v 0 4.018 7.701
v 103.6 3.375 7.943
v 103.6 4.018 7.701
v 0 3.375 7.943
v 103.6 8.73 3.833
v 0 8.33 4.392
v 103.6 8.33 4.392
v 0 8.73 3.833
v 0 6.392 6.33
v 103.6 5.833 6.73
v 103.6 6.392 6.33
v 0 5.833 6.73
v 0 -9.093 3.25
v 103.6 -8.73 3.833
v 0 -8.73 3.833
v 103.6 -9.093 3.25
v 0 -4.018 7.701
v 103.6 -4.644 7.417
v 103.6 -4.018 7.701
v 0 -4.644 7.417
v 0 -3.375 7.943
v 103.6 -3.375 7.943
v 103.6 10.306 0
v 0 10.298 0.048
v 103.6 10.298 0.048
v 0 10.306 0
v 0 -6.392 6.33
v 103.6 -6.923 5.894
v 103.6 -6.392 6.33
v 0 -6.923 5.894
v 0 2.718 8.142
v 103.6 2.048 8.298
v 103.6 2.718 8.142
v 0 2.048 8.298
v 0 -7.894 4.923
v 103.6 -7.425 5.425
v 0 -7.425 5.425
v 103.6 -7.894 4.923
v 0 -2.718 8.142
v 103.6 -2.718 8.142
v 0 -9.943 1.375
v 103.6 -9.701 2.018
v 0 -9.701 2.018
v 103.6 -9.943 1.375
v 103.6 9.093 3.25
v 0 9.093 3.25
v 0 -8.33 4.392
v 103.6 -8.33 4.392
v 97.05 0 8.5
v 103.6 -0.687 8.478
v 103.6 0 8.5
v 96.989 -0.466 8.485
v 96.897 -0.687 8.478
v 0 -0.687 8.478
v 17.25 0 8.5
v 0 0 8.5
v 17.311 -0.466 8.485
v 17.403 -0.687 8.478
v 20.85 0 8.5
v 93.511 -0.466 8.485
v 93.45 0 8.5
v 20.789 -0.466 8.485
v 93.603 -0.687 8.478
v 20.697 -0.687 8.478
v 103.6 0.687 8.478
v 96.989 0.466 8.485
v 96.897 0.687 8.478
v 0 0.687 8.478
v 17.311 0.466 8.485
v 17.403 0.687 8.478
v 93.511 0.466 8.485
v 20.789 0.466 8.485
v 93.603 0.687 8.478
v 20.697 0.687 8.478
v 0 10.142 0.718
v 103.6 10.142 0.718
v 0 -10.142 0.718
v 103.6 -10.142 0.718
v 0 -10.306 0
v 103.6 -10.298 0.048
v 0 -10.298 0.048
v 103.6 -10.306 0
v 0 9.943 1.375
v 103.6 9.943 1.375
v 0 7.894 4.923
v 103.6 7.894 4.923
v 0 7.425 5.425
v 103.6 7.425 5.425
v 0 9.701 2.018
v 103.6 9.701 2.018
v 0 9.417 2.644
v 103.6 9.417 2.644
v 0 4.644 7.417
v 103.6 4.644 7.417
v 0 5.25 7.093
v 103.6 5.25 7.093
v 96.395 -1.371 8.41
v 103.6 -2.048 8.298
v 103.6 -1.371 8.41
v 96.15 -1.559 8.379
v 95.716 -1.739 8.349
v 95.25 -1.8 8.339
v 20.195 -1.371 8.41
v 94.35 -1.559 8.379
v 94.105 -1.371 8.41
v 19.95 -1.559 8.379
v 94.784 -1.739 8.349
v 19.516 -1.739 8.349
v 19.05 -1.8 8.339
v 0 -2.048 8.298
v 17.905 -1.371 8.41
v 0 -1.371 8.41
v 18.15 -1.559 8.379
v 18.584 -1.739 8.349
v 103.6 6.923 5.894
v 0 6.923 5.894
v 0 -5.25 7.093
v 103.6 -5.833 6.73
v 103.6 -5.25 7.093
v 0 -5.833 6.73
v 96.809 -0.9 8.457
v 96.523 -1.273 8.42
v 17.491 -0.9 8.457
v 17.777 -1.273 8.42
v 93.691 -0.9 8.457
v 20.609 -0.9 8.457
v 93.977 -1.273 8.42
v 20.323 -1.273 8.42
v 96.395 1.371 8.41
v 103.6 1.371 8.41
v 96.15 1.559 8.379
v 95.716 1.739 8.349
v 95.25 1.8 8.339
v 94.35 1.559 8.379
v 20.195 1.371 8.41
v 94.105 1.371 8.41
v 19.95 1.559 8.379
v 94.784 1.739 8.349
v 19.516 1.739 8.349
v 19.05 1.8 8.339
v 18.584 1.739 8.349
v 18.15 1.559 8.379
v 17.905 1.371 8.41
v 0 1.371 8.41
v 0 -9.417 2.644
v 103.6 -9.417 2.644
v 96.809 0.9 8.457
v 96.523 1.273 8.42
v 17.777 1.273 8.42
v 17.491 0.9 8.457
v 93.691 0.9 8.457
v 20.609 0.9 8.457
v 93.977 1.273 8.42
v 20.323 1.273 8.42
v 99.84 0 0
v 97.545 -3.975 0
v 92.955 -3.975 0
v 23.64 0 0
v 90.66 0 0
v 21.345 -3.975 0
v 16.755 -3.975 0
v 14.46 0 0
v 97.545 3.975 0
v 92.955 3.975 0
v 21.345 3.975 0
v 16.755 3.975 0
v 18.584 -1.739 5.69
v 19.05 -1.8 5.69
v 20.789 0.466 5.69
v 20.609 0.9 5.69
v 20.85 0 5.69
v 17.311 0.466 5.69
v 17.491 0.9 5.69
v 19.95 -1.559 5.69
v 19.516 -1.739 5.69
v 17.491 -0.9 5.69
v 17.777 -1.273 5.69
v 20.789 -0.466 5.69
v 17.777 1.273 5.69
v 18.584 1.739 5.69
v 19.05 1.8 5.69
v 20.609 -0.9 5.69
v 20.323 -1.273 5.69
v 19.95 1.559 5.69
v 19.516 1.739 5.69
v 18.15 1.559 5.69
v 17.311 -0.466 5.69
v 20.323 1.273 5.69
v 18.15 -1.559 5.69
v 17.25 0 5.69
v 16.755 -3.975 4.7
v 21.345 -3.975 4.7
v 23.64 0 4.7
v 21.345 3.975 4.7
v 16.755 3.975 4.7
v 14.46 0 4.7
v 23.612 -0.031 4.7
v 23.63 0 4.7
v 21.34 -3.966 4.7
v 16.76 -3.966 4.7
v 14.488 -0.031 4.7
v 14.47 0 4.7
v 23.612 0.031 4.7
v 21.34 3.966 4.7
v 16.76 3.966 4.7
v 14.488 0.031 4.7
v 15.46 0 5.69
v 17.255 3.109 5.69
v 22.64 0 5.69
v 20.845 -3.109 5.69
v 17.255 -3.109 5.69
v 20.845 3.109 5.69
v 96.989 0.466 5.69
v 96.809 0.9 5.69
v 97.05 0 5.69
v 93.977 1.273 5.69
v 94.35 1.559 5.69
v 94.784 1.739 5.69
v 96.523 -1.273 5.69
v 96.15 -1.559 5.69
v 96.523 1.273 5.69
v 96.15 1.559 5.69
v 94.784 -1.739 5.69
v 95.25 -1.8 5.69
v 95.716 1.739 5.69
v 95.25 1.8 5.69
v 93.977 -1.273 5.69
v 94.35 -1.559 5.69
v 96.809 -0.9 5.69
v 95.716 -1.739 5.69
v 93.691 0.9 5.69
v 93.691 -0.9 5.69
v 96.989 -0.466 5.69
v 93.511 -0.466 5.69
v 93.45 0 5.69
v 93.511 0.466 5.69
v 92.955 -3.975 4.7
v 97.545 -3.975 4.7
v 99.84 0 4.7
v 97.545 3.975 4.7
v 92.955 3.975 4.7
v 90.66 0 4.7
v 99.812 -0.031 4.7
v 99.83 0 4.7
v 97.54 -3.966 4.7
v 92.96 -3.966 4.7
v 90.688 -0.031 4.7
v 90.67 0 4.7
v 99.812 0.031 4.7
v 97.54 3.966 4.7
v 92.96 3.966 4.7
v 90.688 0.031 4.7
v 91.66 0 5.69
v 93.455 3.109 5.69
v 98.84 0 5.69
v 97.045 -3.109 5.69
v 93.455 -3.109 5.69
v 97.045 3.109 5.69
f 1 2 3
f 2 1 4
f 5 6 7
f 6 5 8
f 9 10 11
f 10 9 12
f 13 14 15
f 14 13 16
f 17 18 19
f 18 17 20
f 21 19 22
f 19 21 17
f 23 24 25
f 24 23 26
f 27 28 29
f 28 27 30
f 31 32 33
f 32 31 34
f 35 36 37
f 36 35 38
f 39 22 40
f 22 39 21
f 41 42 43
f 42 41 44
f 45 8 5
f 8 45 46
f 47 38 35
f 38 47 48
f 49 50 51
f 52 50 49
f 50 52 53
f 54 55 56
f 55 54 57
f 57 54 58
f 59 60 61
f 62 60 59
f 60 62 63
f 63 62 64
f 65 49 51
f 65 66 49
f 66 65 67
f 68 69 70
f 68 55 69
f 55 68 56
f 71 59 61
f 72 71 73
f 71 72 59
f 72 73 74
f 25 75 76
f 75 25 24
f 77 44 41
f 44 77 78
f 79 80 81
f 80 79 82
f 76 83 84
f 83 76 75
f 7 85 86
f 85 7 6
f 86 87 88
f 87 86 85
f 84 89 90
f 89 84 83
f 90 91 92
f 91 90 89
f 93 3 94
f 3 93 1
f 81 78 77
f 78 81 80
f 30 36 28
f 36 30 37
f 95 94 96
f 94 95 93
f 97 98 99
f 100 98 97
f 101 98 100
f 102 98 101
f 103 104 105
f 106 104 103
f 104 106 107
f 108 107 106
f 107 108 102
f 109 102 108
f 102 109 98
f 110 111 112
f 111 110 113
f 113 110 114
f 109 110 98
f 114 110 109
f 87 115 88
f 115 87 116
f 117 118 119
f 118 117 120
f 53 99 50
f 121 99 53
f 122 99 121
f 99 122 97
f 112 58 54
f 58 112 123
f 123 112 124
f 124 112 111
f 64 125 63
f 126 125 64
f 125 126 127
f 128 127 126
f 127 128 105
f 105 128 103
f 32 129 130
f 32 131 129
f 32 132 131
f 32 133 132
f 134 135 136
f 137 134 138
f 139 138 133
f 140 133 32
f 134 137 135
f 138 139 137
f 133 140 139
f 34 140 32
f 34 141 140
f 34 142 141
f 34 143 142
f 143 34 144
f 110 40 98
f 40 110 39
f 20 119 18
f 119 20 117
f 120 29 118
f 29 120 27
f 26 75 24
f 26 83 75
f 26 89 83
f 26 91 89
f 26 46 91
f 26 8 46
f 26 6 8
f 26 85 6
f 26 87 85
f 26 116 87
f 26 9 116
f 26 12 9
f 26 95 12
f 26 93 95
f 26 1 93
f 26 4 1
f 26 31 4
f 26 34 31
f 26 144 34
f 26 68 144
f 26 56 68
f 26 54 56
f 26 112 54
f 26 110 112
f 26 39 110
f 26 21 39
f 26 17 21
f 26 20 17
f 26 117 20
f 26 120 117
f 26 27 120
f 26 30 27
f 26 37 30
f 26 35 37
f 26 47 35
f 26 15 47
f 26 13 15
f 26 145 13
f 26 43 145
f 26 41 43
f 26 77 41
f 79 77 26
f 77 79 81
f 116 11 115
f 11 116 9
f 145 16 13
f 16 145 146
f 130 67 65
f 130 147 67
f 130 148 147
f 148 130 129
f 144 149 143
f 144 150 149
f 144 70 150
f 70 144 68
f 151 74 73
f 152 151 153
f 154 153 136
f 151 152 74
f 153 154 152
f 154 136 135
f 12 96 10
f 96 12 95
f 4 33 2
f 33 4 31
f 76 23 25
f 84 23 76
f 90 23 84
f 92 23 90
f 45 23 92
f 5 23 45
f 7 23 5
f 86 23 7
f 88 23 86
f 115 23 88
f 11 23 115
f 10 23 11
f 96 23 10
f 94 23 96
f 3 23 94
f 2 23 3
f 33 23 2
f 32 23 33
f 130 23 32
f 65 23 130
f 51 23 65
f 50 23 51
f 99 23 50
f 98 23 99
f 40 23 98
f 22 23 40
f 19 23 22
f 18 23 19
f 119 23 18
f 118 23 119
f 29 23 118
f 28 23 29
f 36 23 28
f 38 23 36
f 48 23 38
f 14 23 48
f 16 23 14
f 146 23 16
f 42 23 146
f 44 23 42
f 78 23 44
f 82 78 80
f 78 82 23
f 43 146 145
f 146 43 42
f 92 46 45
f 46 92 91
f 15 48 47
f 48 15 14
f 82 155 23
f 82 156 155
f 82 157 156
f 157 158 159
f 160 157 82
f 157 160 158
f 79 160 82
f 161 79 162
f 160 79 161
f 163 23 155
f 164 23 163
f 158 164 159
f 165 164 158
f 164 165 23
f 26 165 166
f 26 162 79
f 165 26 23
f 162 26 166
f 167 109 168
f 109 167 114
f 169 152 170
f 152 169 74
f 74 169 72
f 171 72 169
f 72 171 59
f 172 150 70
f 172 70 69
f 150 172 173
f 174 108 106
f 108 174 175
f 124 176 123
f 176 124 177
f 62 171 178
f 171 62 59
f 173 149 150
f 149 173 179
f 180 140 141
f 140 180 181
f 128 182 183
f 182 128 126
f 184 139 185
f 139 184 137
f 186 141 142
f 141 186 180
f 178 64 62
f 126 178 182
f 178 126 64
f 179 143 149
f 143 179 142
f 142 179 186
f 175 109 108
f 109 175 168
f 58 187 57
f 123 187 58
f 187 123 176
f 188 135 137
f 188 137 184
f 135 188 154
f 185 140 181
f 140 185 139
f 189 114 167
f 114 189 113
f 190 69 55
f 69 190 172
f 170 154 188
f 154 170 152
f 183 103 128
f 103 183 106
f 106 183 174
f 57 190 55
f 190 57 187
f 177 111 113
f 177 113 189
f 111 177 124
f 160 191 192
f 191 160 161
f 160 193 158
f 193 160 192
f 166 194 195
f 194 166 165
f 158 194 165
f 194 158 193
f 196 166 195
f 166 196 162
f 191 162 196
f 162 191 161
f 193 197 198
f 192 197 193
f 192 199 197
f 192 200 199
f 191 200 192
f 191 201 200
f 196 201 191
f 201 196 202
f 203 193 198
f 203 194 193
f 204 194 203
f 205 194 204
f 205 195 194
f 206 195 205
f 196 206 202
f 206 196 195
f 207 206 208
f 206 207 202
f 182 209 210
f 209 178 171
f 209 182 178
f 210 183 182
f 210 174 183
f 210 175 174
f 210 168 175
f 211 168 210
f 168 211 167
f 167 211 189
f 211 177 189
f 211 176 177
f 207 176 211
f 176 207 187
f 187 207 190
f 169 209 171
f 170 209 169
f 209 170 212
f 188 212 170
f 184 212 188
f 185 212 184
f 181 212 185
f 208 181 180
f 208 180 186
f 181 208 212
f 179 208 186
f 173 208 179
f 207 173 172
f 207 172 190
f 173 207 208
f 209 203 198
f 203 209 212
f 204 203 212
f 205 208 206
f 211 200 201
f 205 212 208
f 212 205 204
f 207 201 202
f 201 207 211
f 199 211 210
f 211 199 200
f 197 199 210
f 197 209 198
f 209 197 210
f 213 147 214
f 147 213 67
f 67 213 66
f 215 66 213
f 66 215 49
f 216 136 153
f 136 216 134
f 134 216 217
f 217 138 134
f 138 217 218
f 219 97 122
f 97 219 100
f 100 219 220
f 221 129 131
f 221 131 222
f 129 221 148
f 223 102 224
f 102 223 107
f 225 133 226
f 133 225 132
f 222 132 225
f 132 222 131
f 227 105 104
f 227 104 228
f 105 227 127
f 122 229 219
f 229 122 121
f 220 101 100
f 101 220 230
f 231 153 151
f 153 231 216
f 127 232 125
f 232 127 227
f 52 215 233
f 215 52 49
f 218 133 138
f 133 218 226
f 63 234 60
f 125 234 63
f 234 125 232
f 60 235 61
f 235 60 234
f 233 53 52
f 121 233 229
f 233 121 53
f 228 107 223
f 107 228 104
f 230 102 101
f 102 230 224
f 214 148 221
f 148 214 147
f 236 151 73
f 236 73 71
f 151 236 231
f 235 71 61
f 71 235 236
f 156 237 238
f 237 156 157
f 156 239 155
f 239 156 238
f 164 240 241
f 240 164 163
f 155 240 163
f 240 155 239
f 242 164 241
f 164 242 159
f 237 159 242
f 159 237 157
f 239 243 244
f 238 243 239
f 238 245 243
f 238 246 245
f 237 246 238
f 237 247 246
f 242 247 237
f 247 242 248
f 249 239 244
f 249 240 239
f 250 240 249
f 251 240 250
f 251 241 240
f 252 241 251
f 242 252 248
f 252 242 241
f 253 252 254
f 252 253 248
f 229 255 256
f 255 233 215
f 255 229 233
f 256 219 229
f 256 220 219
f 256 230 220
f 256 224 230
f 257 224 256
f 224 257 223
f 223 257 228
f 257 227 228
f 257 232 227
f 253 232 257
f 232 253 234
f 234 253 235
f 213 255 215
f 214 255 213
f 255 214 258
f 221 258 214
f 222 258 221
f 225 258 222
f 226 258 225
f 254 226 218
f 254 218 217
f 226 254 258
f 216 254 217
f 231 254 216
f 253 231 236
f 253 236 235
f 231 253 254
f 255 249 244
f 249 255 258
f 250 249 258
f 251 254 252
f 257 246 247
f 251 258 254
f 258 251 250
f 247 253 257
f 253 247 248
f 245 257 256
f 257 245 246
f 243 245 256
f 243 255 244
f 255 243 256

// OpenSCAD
//Parametric Nut trap for Mostly Printed CNC Router
//July 7,2015 By: David Bunch
//
//I needed to make a length that would fit with my customized tool holder for
//a Mastergrip rotary tool I bought at Costco years ago, so I decided to make it parametric.
//Spacing for my tool holder is 53mm distance between holes

//Even though this is for the U.S. Standard Version, I use mm for dimensions

//CUSTOMIZER VARIABLES

//1. Spacing between Nuts
NutSpacing=76.2;     //mm spacing between Nuts (original design seems to be 76.2mm)

//2. Diameter of Nut Holder (21mm is U.S. Version Size)
THNT_Dia=21;      //Dia Tool Holder Nut Trap

//3. Resolution of Nut Holder (96 gives you about .7mm length segments in curve)
ires=96;    //Number of  segments for Tool Holder
                    //Circumference of 21mm Dia circle is 65.97
                    //Making each segment about .7mm will give you 96 for the number of sides

//4. Diameter of Bolt Threading
M3Dia=3.6;             //Dia. of Hole

//5. Resolution of Bolt Threads (24 gives .47mm length segments in curve)
M3_ires=24;         //Number of segments for M3 holes (.47mm segments)
                    //original design was 180 sides (.06mm segments)
//6. Diameter of Nut
M3NutDia=9.18;

//7. Height of Nut trap
M3Nut_Ht=4.7;

//8. Offset from Left for 1st Nut Trap
LtNutOffset=19.05;      //Original Design is 19.05mm

//9. Offset from Right of 2nd Nut Trap (Original is 6.35mm)
RtNutOffset=8.35;       //(I decided to add 2mm to this gap)

//10. Rotation of Nut Trap (0 = Original or 30 = Nut face parallel with End)
RotNut=0;	//	[0:Original, 30:parallel with End]

//11. Print 1 or 2 Nut Traps
Qty=1;

//12. Change this number to make it thicker or thinner
Z_Origin=-2;      //Z origin of Nut trap profile cylinder to extrude
//CUSTOMIZER VARIABLES END
//----------------------------------------
//	This creates a drop down box of numbered options

Len=LtNutOffset+RtNutOffset+NutSpacing;     //Total Length of Nut Trap
echo("Len = ",Len);
RtNut_X=Len-RtNutOffset;



//Len=101.6;   //Original Tool Holder Nut Trap length was 101.6
Cube_z=(Z_Origin + 30)* (-1);
module Base()
{
    difference()
    {
        translate([0,0,Z_Origin])
        rotate([0,90,0])
        cylinder(d=THNT_Dia,h=Len,$fn=ires);
        translate([-1,-15,-30])
        cube([Len+2,30,30]);
    }
}
module DrawFinal()
{
    difference()
    {
        Base();
//Drill the Left Bolt Hole
        translate([LtNutOffset,0,-1])
        cylinder(d=M3Dia,h=12,$fn=M3_ires);
//Cut Left Nut Trap
        translate([LtNutOffset,0,-1])
        rotate([0,0,RotNut])            //Rotate Nut either 0 or 30
                                        //rotating 30 gives more plastic between Nut and end
        cylinder(d=M3NutDia,h=M3Nut_Ht+1,$fn=6);        //6 sided Nut trap hole
        translate([LtNutOffset,0,M3Nut_Ht-.01])
        rotate([0,0,RotNut])            //Rotate Nut either 0 or 30
        cylinder(d1=M3NutDia,d2=M3NutDia-2,h=1,$fn=6);  //Add slight taper for nut hole
//Drill the Right Bolt Hole
        translate([RtNut_X,0,-1])
        cylinder(d=M3Dia,h=12,$fn=M3_ires);
//Cut Right Nut Trap
        translate([RtNut_X,0,-1])
        rotate([0,0,RotNut])            //Rotate Nut either 0 or 30
        cylinder(d=M3NutDia,h=M3Nut_Ht+1,$fn=6);        //6 sided Nut trap hole
        translate([RtNut_X,0,M3Nut_Ht-.01])
        rotate([0,0,RotNut])            //Rotate Nut either 0 or 30
        cylinder(d1=M3NutDia,d2=M3NutDia-2,h=1,$fn=6);  //Add slight taper for nut hole
    }
}
DrawFinal();
if (Qty == 2)
{
    translate([0,25,0])
    DrawFinal();
}
